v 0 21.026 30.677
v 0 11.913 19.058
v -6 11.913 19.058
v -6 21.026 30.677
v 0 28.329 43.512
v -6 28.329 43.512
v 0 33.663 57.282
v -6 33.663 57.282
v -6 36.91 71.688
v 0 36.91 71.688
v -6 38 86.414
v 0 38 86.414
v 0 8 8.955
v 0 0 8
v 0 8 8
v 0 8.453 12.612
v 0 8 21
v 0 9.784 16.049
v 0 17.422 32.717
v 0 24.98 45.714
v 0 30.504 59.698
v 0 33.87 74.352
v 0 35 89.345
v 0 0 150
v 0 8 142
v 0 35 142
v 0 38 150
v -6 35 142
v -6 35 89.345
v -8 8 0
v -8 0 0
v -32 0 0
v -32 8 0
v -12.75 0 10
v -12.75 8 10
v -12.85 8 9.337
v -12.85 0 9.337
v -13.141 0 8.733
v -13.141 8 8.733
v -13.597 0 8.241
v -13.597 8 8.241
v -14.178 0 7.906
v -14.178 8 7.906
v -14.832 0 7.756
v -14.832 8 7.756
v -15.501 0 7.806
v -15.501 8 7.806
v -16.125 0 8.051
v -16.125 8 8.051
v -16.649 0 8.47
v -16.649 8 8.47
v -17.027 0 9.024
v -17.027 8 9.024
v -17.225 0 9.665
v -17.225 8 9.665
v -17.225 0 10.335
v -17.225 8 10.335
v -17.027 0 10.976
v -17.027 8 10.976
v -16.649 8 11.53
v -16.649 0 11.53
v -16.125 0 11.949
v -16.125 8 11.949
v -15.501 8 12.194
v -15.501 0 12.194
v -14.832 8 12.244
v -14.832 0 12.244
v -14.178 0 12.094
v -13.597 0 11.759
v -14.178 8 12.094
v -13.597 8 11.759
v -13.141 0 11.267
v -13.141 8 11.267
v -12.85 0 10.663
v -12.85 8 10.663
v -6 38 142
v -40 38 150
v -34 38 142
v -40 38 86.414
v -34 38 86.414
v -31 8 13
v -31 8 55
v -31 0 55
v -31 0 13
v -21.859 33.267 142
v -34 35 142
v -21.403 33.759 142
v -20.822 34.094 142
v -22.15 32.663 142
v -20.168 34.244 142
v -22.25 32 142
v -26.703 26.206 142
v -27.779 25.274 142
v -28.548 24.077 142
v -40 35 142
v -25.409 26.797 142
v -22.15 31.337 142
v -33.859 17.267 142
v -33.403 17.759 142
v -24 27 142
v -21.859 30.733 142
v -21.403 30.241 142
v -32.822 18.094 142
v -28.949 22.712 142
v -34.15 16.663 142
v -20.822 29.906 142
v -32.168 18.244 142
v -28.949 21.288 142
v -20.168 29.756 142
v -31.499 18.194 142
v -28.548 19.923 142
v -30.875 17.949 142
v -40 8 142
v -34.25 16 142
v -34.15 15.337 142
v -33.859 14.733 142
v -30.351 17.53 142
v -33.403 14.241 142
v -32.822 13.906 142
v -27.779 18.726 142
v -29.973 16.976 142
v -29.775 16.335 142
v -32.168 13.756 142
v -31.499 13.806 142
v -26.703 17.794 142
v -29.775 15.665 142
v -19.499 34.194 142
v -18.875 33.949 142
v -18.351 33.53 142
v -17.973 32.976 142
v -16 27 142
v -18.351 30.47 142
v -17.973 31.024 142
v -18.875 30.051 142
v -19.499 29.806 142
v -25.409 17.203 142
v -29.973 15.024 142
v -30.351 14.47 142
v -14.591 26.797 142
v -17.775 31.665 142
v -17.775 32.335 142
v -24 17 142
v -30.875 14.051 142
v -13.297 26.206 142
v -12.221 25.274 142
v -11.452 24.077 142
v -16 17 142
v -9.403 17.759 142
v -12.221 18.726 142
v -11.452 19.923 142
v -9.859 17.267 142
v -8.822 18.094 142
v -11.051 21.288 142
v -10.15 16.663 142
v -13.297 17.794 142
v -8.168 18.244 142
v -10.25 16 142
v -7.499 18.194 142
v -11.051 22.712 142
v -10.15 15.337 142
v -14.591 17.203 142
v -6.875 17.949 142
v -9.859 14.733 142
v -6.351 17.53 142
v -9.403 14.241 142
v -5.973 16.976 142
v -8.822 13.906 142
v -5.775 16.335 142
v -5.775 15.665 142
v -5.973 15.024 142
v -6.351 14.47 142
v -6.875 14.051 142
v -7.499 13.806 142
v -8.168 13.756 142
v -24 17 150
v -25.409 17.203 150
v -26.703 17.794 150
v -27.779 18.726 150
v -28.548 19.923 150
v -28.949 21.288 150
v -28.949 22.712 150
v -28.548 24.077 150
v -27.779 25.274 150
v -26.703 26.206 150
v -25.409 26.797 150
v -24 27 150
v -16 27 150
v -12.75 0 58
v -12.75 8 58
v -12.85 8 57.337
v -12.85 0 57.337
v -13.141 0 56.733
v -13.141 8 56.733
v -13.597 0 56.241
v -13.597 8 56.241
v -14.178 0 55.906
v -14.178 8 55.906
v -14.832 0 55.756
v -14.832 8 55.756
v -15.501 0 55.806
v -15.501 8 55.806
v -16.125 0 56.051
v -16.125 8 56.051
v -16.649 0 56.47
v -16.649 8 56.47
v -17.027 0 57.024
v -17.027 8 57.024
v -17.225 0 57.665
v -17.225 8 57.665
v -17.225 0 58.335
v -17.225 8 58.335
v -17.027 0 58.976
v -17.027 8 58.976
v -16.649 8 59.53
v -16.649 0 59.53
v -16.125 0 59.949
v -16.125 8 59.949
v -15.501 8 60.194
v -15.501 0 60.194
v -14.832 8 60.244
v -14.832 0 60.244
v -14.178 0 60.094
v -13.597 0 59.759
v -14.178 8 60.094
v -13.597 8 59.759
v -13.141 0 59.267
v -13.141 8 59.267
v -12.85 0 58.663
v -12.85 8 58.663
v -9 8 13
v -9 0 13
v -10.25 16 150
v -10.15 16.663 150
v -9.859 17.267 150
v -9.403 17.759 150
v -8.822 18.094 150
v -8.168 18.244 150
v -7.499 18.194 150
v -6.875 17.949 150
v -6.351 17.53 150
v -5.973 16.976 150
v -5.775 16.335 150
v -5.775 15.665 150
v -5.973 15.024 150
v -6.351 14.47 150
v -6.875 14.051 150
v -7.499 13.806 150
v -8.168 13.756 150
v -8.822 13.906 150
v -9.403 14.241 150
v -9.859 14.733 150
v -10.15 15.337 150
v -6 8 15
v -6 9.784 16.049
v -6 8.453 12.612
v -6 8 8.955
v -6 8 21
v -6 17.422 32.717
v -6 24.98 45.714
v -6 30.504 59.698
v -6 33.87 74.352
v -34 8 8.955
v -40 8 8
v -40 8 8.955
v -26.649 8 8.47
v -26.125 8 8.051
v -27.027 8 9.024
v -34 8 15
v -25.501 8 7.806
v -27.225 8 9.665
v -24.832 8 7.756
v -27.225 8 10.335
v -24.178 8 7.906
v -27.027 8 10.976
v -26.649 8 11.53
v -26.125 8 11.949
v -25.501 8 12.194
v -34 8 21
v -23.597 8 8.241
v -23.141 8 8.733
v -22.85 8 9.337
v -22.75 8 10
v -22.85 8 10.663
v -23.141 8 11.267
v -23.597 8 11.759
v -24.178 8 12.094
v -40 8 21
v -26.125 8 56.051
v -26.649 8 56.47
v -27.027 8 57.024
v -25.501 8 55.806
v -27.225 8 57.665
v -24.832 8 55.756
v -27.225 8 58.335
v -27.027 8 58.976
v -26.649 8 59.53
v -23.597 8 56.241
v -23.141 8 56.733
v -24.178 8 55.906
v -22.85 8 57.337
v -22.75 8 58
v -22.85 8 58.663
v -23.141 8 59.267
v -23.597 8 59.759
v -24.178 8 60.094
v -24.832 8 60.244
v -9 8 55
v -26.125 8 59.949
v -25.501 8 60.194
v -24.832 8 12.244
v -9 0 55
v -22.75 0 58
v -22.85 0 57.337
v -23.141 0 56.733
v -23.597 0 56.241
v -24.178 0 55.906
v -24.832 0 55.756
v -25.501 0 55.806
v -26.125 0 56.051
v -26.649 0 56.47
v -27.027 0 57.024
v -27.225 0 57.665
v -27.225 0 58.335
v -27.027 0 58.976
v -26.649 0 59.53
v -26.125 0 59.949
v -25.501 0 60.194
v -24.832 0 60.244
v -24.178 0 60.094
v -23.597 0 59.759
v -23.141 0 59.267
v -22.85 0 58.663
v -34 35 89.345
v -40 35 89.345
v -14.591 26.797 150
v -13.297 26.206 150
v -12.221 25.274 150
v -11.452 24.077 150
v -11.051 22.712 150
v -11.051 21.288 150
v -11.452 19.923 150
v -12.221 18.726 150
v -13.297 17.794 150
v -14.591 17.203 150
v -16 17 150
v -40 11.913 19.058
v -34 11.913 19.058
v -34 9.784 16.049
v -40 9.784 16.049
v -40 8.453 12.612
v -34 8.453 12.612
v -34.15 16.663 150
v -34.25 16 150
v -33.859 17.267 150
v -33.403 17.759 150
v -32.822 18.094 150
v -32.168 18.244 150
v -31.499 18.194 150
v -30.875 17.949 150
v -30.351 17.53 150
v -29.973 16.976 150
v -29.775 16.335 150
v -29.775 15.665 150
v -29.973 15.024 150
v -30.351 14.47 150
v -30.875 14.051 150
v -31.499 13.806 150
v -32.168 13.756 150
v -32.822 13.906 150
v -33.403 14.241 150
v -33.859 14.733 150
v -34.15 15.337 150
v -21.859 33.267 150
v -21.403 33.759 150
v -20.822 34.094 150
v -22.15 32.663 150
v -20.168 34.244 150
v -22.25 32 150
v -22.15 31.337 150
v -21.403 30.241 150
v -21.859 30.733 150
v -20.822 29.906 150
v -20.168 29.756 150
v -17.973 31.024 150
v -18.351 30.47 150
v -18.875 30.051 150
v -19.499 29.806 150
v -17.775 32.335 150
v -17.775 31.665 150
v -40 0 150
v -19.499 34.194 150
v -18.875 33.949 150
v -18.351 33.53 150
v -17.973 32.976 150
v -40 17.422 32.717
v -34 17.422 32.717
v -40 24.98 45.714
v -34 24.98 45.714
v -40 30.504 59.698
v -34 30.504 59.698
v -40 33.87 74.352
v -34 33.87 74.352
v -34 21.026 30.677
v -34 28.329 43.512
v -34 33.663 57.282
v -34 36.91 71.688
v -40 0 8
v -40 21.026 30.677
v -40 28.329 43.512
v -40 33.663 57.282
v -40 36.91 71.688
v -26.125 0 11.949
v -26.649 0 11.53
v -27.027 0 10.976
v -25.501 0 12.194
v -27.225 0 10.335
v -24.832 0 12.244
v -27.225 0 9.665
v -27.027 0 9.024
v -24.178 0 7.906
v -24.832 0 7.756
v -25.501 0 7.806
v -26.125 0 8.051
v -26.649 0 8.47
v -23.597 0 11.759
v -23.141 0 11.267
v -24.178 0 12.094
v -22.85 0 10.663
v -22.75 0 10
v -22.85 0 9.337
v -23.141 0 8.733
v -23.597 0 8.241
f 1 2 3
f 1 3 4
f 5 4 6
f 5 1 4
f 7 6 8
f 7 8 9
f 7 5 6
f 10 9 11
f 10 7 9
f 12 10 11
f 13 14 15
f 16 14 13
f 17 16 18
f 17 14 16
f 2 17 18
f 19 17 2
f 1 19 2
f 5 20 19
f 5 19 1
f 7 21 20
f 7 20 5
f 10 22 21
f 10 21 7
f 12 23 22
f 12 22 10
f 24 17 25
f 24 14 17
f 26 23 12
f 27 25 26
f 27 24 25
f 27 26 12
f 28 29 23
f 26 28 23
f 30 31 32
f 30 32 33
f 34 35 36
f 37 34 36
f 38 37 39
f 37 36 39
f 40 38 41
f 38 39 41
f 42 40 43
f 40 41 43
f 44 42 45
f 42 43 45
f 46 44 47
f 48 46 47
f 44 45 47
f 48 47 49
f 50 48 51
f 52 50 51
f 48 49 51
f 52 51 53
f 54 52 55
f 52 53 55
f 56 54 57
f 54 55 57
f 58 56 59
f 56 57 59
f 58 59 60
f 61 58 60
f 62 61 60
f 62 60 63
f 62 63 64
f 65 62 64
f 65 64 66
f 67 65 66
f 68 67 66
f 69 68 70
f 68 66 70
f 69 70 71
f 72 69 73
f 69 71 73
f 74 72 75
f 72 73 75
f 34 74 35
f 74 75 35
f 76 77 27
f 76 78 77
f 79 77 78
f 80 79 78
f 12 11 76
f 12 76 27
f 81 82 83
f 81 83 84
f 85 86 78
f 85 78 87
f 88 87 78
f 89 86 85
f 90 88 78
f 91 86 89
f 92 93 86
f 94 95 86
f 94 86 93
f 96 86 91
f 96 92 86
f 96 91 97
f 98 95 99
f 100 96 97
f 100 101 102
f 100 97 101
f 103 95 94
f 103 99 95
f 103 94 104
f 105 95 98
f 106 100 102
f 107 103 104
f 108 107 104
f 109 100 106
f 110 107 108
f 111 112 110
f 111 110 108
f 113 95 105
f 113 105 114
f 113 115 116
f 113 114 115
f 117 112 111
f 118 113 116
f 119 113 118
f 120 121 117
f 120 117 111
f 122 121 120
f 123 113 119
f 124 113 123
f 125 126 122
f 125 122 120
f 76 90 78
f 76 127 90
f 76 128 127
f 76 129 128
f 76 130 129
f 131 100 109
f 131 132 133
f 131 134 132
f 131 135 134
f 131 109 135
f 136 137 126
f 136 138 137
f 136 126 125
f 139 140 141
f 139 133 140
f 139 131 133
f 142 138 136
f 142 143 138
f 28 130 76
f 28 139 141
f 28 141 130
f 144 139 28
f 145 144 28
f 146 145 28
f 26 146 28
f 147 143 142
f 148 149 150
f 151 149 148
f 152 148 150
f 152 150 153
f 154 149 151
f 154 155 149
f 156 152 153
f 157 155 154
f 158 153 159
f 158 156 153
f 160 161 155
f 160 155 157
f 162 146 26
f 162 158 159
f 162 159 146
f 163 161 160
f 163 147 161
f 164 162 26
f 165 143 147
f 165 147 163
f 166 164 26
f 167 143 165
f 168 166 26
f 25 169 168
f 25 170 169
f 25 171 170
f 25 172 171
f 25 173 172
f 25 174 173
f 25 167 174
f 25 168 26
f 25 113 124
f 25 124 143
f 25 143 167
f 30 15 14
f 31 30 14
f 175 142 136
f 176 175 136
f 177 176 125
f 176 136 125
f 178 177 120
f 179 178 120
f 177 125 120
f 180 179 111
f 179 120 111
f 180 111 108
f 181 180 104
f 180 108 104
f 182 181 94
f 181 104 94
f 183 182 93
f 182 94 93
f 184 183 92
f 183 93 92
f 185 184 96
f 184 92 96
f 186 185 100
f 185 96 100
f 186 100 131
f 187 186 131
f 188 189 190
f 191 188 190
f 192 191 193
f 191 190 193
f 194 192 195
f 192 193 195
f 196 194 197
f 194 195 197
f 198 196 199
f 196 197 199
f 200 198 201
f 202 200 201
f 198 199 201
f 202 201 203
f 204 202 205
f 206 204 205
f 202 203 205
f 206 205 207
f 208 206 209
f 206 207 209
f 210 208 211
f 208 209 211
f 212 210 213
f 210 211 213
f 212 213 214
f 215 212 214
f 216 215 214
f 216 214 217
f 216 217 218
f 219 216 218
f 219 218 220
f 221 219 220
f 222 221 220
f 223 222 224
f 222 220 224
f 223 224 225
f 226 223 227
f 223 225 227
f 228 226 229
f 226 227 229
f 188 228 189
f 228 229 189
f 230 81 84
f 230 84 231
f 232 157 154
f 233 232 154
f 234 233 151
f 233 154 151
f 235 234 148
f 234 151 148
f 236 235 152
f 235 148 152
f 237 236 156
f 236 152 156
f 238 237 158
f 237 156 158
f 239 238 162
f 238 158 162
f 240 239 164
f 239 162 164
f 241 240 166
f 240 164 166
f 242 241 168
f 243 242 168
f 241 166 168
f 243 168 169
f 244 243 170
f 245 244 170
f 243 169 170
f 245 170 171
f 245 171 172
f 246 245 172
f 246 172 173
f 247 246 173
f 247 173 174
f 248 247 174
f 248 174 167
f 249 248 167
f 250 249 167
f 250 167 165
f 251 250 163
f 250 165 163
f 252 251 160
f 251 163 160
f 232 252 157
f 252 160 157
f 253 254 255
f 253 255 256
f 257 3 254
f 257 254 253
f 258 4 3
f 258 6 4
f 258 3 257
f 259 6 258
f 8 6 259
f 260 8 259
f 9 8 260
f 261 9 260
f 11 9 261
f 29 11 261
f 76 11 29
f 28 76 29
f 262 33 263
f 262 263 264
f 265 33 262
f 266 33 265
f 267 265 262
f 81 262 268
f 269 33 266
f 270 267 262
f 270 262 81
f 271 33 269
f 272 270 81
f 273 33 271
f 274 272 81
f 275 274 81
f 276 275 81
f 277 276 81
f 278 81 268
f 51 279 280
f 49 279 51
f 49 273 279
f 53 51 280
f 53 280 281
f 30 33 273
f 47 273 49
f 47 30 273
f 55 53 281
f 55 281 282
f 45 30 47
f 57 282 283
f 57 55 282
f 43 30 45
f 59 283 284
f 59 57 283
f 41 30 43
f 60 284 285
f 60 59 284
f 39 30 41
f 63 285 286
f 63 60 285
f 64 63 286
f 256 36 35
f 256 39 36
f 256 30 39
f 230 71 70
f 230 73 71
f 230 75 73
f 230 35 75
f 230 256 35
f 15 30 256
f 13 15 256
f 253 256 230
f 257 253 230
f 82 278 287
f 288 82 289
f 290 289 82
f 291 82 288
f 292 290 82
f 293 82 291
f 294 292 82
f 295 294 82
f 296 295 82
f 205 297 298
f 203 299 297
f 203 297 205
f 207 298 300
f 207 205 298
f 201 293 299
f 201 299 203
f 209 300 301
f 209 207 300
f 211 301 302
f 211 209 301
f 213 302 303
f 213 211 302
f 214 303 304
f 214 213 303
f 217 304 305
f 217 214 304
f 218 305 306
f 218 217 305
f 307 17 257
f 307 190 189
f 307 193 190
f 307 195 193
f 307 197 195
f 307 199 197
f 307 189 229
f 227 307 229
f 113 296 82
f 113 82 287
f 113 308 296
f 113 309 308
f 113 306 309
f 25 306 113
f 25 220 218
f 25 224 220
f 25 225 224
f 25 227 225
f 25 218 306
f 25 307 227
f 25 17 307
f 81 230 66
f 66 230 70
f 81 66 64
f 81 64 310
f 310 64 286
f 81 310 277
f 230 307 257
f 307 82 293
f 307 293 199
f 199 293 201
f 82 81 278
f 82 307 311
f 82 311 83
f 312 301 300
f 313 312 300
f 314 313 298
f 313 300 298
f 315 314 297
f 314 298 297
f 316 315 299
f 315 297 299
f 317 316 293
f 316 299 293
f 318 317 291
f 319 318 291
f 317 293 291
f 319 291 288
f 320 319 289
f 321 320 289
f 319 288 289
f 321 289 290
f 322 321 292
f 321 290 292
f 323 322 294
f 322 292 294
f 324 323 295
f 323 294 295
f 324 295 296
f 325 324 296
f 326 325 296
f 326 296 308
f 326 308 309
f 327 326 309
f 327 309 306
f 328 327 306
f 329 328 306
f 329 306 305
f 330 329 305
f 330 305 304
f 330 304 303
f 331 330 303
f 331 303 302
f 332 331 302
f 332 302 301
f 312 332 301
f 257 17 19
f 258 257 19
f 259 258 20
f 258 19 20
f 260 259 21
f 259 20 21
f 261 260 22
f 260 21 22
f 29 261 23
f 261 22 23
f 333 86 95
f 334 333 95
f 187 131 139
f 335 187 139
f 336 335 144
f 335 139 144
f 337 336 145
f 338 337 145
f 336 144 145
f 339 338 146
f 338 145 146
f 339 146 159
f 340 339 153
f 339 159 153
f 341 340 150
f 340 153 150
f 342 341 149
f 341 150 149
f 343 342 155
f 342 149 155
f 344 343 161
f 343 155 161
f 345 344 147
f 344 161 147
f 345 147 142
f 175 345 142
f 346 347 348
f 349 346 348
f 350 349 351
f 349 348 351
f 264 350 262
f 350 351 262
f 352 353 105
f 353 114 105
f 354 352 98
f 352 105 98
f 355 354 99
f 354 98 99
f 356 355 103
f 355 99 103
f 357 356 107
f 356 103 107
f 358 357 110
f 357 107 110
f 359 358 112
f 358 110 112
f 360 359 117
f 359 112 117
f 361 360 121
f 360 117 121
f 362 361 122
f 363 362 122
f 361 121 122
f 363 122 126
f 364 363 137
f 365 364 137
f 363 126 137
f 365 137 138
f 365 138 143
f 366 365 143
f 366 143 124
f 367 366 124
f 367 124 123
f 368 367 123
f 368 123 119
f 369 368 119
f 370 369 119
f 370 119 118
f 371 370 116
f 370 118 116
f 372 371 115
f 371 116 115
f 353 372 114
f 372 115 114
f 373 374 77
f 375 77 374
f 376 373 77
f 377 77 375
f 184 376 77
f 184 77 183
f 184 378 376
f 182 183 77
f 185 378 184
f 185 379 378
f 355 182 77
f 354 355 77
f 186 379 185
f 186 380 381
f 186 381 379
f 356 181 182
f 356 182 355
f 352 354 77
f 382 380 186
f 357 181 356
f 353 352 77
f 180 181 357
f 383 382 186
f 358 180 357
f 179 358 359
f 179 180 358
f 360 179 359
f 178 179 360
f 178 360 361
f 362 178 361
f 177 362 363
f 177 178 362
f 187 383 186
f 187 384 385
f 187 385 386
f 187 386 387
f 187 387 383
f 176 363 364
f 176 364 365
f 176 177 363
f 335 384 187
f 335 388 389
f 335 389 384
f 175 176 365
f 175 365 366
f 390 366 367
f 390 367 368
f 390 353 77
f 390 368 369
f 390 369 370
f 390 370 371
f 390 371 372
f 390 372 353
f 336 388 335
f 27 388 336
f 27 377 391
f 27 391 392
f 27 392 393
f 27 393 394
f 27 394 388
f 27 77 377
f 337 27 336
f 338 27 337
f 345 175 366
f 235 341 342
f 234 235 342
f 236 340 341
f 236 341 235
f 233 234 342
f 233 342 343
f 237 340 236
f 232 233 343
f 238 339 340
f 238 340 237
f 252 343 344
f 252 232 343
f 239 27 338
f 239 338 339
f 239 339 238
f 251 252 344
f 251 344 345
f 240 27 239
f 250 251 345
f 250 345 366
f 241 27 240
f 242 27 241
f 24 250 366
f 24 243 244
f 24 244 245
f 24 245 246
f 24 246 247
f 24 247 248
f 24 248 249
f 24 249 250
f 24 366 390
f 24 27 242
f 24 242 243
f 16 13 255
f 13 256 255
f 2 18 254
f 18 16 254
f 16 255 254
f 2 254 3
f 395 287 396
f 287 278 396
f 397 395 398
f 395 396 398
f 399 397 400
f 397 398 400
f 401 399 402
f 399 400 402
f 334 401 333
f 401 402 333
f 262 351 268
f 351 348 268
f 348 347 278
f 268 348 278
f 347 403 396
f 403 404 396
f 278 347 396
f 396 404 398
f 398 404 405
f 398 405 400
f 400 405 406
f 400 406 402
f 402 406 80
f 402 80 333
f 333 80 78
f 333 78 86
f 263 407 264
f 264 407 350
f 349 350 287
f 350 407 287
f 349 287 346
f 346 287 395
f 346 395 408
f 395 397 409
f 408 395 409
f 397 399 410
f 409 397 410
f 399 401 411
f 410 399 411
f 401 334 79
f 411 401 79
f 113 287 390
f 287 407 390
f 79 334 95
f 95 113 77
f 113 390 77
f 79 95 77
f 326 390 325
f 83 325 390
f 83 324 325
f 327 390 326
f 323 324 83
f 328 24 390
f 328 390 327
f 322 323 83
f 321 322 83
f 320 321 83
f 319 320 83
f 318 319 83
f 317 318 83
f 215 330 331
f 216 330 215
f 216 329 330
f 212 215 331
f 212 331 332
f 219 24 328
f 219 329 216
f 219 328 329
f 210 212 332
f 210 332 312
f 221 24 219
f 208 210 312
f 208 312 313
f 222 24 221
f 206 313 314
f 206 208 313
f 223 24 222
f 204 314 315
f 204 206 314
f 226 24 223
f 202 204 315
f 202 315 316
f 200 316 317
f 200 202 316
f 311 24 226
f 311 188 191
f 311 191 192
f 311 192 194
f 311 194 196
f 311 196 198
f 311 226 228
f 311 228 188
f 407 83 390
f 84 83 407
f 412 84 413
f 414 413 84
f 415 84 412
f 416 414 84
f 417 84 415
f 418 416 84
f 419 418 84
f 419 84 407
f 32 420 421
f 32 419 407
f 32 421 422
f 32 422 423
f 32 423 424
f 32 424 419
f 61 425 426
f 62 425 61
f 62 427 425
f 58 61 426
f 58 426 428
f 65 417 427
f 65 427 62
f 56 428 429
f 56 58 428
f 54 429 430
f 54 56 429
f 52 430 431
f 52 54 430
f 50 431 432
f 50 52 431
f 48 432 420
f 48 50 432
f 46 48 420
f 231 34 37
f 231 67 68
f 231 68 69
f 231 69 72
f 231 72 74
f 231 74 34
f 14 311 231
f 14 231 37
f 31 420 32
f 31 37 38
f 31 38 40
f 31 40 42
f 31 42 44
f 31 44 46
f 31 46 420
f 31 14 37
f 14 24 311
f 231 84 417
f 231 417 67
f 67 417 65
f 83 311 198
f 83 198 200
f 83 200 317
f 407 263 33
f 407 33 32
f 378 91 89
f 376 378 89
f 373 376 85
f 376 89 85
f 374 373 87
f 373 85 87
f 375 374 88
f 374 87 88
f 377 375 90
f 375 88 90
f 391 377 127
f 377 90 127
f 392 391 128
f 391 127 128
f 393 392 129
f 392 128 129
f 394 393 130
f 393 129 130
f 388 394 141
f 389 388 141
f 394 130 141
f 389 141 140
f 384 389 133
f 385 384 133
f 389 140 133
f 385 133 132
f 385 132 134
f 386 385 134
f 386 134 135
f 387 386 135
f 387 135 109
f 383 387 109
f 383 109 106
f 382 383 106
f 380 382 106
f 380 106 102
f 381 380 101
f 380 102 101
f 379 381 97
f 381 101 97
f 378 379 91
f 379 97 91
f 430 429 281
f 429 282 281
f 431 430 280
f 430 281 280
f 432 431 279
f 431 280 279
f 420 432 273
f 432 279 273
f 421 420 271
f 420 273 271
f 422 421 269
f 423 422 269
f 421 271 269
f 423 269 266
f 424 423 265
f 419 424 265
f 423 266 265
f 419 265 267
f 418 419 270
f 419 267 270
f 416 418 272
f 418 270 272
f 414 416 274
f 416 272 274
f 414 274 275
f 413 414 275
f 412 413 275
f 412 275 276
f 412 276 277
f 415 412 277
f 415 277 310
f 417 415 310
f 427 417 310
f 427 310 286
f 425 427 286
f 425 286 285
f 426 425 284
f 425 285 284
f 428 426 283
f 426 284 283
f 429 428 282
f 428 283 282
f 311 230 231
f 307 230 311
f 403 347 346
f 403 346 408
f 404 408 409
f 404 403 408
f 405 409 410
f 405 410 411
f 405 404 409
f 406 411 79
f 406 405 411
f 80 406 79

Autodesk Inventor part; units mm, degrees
ref_plane "YZ Plane" through (0, 0, 0) normal (1, 0, 0) x (0, 1, 0)
ref_plane "XZ Plane" through (0, 0, 0) normal (0, 1, 0) x (-1, 0, 0)
ref_plane "XY Plane" through (0, 0, 0) normal (0, 0, 1) x (1, 0, 0)
sketch "Sketch1" plane through (0, 0, 0) normal (1, 0, 0) x (0, 1, 0)
  line L0 (0, 0) -> (8, 0)
  line L1 (8, 0) -> (8, 150)
  line L2 (8, 150) -> (0, 150)
  line L3 (0, 150) -> (0, 0)
  dimension "d0" = 150
  dimension "d1" = 8
extrude "BODY1" add sketch "Sketch1" against normal blind 40
sketch "Sketch2" plane through (0, 8, 150) normal (0, 1, 0) x (1, 0, 0)
  line L0 (0, 0) -> (-40, 0)
  line L1 (-40, 0) -> (-40, 8)
  line L2 (-40, 8) -> (0, 8)
  line L3 (0, 8) -> (0, 0)
  dimension "d4" = 40
  dimension "d5" = 8
extrude "BODY2" add sketch "Sketch2" along normal blind 30
sketch "Sketch3" plane through (-40, 8, 0) normal (0, 1, 0) x (1, 0, 0)
  line L0 (40, 0) -> (0, 0) construction
  line L1 (0, -142) -> (0, 0) construction
  circle A0 centre (15, -10) radius 2.25
  circle A1 centre (25, -10) radius 2.25
  circle A2 centre (15, -58) radius 2.25
  circle A3 centre (25, -58) radius 2.25
  line L2 (9, -13) -> (31, -13)
  line L3 (31, -13) -> (31, -55)
  line L4 (31, -55) -> (9, -55)
  line L5 (9, -55) -> (9, -13)
  dimension "d8" = 48
  dimension "d9" = 48
  dimension "d10" = 10
  dimension "d11" = 10
  dimension "d12" = 4.5
  dimension "d13" = 4.5
  dimension "d14" = 4.5
  dimension "d15" = 4.5
  dimension "d16" = 15
  dimension "d17" = 10
  dimension "d18" = 15
  dimension "d19" = 10
  dimension "d20" = 22
  dimension "d21" = 42
  dimension "d22" = 9
  dimension "d23" = 3
extrude "SERVO" cut sketch "Sketch3" against normal blind 8
sketch "Sketch4" plane through (0, 8, 142) normal (0, 0, -1) x (-1, 0, 0)
  line L0 (40, 0) -> (0, 0) construction
  line L1 (40, 0) -> (40, 30) construction
  line L2 (0, 30) -> (40, 30) construction
  line L3 (0, 0) -> (0, 30) construction
  line L4 (24, 19) -> (16, 19)
  line L5 (16, 19) -> (16, 9)
  line L6 (16, 9) -> (24, 9)
  line L7 (24, 9) -> (24, 19)
  arc A0 (24, 9) -> (24, 19) centre (24, 14) ccw
  arc A1 (16, 19) -> (16, 9) centre (16, 14) ccw
  circle A2 centre (20, 24) radius 2.25
  circle A3 centre (32, 8) radius 2.25
  circle A4 centre (8, 8) radius 2.25
  point P0 (0, -8)
  dimension "d26" = 11
  dimension "d28" = 8
  dimension "d29" = 10
  dimension "d30" = 16
  dimension "d32" = 4.5
  dimension "d33" = 4.5
  dimension "d34" = 4.5
  dimension "d35" = 20
  dimension "d36" = 8
  dimension "d37" = 8
  dimension "d39" = 6
  dimension "d40" = 8
  dimension "d41" = 8
extrude "CONNECTION" cut sketch "Sketch4" against normal blind 8
chamfer "v3_servo_chamfer" distance 8 angle 45 2 edges at (0, 4, 0) (-40, 4, 0)
sketch "v3_ribs_sketch" plane through (0, 8, 142) normal (0, 0, -1) x (-1, 0, 0)
  line L0 (0, 30) -> (0, -8) construction
  line L1 (0, 30) -> (6, 30)
  line L2 (6, 30) -> (6, 27)
  line L3 (6, 27) -> (0, 27)
  line L4 (0, 27) -> (0, 30)
  line L5 (40, 30) -> (0, 30) construction
  line L6 (40, 30) -> (34, 30)
  line L7 (34, 30) -> (34, 27)
  line L8 (34, 27) -> (40, 27)
  line L9 (40, 27) -> (40, 30)
  dimension "d66" = 6
  dimension "d67" = 3
  dimension "d68" = 6
  dimension "d69" = 3
sketch "Sketch8" plane through (-40, 8, 142) normal (0, 1, 0) x (1, 0, 0)
  line L0 (0, 0) -> (0, 134) construction
  line L1 (40, 134) -> (40, 0) construction
  line L2 (32, 142) -> (8, 142) construction
  line L3 (40, 127) -> (34, 127)
  line L4 (34, 127) -> (34, 121)
  line L5 (34, 121) -> (40, 121)
  line L6 (40, 121) -> (40, 127)
  line L7 (0, 127) -> (6, 127)
  line L8 (6, 127) -> (6, 121)
  line L9 (6, 121) -> (0, 121)
  line L10 (0, 121) -> (0, 127)
  point P0 (40, 142)
  dimension "d70" = 6
  dimension "d71" = 6
  dimension "d72" = 6
  dimension "d73" = 6
  dimension "d74" = 15
  dimension "d75" = 15
extrude "v3_ribs_extrusion1" add sketch "Sketch8" along normal blind 30
extrude "v3_ribs_extrusion2" add sketch "v3_ribs_sketch" along normal blind 122
chamfer "v3_ribs_chamfer1" distance 27 angle 45 2 edges at (-3, 35, 21) (-37, 35, 21)
fillet "v3_ribs_fillet1" radius 100 2 edges at (-3, 35, 47.9999) (-37, 35, 47.9999)
fillet "v3_ribs_fillet2" radius 100 2 edges at (-3, 38, 15) (-37, 38, 15)
fillet "v3_ribs_fillet3" radius 15 2 edges at (-3, 8, 15) (-37, 8, 15)
equation "\"d4\" = d2"
equation "\"d5\" = d1"
equation "\"d9\" = d8"
equation "\"d11\" = d10"
equation "\"d13\" = d12"
equation "\"d14\" = d12"
equation "\"d15\" = d12"
equation "\"d18\" = d16"
equation "\"d19\" = d17"
equation "\"d32\" = d12"
equation "\"d33\" = d12"
equation "\"d34\" = d12"
equation "\"d37\" = d36"
equation "\"d41\" = d40"
equation "\"d68\" = d66"
equation "\"d69\" = d67"
equation "\"d70\" = d72"
equation "\"d71\" = d72"
equation "\"d72\" = d66"
equation "\"d73\" = d66"
equation "\"d75\" = d74"
equation "\"d2\" = 40"
properties part number "BONE_v3" material "PLA plastic"
